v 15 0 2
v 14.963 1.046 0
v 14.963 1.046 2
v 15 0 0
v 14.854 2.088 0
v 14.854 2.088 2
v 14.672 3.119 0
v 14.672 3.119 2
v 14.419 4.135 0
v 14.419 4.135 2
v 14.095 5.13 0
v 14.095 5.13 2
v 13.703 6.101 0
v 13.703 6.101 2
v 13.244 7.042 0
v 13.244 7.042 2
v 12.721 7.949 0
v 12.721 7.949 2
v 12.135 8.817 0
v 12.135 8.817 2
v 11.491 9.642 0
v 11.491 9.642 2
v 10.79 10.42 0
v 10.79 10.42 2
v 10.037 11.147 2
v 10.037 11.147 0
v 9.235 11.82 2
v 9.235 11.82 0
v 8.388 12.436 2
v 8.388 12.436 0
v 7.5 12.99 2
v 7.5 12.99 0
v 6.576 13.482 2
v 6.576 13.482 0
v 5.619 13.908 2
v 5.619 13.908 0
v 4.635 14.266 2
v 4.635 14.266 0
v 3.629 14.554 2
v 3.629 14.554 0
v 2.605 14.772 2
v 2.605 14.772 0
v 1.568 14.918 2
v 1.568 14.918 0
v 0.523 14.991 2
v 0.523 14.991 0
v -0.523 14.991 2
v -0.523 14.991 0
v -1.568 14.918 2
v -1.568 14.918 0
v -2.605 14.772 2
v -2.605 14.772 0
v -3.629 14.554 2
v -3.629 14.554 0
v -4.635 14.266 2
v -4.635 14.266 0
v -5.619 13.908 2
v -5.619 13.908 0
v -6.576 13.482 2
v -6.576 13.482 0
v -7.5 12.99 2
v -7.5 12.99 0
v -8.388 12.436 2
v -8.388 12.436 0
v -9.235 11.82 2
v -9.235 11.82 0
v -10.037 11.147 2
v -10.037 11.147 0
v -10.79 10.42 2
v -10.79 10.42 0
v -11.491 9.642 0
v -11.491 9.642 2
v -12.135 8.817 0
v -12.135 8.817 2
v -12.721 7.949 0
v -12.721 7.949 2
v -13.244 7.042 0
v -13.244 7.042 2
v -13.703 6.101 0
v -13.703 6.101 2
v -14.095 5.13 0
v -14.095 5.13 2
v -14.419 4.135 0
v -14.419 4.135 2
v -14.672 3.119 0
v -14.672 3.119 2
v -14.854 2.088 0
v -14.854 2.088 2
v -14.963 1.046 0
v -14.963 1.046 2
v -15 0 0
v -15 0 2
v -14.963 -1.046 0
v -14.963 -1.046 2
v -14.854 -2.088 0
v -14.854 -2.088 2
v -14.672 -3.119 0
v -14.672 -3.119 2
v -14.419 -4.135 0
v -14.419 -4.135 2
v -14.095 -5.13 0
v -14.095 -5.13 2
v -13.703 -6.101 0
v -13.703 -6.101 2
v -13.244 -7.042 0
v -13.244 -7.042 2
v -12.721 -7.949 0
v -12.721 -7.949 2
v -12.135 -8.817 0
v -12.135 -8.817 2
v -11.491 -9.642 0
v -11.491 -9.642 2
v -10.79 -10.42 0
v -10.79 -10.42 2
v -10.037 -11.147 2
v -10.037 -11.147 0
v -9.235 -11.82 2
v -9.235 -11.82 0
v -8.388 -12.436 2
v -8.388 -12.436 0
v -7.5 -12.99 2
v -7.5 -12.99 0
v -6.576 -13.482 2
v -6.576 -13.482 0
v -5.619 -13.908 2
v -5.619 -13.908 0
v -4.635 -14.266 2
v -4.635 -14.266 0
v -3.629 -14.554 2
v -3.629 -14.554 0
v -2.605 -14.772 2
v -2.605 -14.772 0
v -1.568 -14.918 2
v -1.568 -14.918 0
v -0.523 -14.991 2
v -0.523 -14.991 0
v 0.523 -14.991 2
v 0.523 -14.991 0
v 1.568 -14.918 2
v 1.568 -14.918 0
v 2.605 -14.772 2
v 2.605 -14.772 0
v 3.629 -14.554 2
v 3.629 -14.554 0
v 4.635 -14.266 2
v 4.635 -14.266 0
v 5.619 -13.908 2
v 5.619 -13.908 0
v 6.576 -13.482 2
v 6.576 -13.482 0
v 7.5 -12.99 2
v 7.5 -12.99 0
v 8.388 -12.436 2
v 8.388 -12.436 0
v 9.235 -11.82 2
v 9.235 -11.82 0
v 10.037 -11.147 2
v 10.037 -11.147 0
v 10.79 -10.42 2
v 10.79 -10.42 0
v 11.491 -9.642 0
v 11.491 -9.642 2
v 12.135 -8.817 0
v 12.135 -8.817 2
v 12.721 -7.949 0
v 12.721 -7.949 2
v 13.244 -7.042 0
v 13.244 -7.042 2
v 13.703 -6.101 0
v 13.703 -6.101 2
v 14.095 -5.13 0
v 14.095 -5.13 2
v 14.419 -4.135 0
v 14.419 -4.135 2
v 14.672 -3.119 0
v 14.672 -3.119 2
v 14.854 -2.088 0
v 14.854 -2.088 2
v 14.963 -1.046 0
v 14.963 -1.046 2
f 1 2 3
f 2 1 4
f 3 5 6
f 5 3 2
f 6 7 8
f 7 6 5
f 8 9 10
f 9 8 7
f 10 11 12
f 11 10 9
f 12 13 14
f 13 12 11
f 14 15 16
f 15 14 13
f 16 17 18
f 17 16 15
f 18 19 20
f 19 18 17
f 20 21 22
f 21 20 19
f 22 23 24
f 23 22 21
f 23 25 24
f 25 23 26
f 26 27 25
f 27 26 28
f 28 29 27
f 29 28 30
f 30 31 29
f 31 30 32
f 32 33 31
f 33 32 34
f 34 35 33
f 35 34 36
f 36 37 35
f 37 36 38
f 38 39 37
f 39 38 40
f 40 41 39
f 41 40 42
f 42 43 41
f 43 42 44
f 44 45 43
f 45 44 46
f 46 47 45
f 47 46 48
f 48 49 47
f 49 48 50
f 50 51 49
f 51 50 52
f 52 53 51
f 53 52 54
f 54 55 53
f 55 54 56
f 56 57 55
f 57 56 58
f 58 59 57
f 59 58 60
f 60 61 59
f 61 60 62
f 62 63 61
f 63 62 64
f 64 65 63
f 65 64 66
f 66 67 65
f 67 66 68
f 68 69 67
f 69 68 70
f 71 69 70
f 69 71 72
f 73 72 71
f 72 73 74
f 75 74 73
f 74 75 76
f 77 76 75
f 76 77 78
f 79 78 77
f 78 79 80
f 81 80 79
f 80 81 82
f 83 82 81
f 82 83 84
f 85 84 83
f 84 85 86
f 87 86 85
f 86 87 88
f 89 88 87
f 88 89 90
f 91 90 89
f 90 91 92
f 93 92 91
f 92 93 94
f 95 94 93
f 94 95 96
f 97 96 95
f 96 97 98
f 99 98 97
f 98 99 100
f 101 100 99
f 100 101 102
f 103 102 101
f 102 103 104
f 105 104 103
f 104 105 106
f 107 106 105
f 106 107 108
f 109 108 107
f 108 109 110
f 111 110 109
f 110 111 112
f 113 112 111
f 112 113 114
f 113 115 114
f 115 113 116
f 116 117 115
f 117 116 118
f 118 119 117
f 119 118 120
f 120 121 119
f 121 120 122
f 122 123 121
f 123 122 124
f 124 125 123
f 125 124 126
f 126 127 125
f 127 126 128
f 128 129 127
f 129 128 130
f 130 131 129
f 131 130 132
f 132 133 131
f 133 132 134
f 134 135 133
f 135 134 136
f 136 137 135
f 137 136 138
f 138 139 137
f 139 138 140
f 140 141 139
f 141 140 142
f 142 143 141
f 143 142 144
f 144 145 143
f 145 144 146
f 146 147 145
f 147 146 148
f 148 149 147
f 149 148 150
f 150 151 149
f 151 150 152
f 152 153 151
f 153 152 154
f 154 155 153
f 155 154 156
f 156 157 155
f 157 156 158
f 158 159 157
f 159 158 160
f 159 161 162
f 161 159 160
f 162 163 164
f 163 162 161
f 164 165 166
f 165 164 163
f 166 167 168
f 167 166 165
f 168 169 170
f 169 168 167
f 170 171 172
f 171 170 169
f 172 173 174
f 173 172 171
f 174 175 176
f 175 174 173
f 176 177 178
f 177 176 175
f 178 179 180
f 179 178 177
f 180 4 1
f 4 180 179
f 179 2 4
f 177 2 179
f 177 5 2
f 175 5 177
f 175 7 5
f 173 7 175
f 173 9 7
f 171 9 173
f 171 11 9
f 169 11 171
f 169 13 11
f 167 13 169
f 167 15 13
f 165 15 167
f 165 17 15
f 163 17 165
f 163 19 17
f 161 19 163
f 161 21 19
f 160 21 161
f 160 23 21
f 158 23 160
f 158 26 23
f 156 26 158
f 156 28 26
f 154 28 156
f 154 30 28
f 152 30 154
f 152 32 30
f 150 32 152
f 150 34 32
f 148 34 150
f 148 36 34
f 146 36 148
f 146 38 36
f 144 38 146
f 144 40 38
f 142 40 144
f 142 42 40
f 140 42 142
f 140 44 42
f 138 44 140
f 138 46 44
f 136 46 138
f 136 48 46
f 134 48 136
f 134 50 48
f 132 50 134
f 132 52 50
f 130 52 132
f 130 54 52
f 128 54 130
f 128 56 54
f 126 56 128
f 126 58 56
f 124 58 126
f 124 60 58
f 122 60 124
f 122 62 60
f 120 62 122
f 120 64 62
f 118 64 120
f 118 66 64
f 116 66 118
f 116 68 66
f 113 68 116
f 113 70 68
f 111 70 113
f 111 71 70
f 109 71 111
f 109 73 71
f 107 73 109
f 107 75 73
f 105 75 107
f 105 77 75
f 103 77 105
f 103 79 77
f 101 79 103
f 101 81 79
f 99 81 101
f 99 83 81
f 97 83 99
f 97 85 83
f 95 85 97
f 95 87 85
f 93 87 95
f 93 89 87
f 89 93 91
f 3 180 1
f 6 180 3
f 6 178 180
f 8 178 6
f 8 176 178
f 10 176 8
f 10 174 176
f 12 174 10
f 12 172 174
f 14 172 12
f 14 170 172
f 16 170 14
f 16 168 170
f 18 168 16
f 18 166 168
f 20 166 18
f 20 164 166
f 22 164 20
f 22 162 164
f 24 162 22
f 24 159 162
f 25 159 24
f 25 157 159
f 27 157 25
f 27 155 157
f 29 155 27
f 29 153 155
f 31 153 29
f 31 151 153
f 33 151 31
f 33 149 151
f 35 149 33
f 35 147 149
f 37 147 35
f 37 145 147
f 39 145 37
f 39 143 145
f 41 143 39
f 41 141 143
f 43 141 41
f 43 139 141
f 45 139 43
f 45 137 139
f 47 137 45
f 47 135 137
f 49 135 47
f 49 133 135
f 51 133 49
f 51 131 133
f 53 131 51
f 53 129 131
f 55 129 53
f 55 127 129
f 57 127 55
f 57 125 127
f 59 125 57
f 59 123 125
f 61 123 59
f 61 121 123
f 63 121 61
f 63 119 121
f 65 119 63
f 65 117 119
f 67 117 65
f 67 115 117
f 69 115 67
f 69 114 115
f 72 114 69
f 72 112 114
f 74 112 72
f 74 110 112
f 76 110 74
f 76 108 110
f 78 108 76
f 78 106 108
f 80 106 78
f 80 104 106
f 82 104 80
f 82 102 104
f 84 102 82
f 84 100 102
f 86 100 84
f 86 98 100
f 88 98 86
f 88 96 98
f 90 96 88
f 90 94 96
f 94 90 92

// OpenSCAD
//------------parameters---------------------------
// diameter of circle
diameter=30;  
// Thickness 
thickness=2;  
// resolution
$fn=90;

//-------------------------------------------------
cylinder (r=diameter/2,h=thickness);
